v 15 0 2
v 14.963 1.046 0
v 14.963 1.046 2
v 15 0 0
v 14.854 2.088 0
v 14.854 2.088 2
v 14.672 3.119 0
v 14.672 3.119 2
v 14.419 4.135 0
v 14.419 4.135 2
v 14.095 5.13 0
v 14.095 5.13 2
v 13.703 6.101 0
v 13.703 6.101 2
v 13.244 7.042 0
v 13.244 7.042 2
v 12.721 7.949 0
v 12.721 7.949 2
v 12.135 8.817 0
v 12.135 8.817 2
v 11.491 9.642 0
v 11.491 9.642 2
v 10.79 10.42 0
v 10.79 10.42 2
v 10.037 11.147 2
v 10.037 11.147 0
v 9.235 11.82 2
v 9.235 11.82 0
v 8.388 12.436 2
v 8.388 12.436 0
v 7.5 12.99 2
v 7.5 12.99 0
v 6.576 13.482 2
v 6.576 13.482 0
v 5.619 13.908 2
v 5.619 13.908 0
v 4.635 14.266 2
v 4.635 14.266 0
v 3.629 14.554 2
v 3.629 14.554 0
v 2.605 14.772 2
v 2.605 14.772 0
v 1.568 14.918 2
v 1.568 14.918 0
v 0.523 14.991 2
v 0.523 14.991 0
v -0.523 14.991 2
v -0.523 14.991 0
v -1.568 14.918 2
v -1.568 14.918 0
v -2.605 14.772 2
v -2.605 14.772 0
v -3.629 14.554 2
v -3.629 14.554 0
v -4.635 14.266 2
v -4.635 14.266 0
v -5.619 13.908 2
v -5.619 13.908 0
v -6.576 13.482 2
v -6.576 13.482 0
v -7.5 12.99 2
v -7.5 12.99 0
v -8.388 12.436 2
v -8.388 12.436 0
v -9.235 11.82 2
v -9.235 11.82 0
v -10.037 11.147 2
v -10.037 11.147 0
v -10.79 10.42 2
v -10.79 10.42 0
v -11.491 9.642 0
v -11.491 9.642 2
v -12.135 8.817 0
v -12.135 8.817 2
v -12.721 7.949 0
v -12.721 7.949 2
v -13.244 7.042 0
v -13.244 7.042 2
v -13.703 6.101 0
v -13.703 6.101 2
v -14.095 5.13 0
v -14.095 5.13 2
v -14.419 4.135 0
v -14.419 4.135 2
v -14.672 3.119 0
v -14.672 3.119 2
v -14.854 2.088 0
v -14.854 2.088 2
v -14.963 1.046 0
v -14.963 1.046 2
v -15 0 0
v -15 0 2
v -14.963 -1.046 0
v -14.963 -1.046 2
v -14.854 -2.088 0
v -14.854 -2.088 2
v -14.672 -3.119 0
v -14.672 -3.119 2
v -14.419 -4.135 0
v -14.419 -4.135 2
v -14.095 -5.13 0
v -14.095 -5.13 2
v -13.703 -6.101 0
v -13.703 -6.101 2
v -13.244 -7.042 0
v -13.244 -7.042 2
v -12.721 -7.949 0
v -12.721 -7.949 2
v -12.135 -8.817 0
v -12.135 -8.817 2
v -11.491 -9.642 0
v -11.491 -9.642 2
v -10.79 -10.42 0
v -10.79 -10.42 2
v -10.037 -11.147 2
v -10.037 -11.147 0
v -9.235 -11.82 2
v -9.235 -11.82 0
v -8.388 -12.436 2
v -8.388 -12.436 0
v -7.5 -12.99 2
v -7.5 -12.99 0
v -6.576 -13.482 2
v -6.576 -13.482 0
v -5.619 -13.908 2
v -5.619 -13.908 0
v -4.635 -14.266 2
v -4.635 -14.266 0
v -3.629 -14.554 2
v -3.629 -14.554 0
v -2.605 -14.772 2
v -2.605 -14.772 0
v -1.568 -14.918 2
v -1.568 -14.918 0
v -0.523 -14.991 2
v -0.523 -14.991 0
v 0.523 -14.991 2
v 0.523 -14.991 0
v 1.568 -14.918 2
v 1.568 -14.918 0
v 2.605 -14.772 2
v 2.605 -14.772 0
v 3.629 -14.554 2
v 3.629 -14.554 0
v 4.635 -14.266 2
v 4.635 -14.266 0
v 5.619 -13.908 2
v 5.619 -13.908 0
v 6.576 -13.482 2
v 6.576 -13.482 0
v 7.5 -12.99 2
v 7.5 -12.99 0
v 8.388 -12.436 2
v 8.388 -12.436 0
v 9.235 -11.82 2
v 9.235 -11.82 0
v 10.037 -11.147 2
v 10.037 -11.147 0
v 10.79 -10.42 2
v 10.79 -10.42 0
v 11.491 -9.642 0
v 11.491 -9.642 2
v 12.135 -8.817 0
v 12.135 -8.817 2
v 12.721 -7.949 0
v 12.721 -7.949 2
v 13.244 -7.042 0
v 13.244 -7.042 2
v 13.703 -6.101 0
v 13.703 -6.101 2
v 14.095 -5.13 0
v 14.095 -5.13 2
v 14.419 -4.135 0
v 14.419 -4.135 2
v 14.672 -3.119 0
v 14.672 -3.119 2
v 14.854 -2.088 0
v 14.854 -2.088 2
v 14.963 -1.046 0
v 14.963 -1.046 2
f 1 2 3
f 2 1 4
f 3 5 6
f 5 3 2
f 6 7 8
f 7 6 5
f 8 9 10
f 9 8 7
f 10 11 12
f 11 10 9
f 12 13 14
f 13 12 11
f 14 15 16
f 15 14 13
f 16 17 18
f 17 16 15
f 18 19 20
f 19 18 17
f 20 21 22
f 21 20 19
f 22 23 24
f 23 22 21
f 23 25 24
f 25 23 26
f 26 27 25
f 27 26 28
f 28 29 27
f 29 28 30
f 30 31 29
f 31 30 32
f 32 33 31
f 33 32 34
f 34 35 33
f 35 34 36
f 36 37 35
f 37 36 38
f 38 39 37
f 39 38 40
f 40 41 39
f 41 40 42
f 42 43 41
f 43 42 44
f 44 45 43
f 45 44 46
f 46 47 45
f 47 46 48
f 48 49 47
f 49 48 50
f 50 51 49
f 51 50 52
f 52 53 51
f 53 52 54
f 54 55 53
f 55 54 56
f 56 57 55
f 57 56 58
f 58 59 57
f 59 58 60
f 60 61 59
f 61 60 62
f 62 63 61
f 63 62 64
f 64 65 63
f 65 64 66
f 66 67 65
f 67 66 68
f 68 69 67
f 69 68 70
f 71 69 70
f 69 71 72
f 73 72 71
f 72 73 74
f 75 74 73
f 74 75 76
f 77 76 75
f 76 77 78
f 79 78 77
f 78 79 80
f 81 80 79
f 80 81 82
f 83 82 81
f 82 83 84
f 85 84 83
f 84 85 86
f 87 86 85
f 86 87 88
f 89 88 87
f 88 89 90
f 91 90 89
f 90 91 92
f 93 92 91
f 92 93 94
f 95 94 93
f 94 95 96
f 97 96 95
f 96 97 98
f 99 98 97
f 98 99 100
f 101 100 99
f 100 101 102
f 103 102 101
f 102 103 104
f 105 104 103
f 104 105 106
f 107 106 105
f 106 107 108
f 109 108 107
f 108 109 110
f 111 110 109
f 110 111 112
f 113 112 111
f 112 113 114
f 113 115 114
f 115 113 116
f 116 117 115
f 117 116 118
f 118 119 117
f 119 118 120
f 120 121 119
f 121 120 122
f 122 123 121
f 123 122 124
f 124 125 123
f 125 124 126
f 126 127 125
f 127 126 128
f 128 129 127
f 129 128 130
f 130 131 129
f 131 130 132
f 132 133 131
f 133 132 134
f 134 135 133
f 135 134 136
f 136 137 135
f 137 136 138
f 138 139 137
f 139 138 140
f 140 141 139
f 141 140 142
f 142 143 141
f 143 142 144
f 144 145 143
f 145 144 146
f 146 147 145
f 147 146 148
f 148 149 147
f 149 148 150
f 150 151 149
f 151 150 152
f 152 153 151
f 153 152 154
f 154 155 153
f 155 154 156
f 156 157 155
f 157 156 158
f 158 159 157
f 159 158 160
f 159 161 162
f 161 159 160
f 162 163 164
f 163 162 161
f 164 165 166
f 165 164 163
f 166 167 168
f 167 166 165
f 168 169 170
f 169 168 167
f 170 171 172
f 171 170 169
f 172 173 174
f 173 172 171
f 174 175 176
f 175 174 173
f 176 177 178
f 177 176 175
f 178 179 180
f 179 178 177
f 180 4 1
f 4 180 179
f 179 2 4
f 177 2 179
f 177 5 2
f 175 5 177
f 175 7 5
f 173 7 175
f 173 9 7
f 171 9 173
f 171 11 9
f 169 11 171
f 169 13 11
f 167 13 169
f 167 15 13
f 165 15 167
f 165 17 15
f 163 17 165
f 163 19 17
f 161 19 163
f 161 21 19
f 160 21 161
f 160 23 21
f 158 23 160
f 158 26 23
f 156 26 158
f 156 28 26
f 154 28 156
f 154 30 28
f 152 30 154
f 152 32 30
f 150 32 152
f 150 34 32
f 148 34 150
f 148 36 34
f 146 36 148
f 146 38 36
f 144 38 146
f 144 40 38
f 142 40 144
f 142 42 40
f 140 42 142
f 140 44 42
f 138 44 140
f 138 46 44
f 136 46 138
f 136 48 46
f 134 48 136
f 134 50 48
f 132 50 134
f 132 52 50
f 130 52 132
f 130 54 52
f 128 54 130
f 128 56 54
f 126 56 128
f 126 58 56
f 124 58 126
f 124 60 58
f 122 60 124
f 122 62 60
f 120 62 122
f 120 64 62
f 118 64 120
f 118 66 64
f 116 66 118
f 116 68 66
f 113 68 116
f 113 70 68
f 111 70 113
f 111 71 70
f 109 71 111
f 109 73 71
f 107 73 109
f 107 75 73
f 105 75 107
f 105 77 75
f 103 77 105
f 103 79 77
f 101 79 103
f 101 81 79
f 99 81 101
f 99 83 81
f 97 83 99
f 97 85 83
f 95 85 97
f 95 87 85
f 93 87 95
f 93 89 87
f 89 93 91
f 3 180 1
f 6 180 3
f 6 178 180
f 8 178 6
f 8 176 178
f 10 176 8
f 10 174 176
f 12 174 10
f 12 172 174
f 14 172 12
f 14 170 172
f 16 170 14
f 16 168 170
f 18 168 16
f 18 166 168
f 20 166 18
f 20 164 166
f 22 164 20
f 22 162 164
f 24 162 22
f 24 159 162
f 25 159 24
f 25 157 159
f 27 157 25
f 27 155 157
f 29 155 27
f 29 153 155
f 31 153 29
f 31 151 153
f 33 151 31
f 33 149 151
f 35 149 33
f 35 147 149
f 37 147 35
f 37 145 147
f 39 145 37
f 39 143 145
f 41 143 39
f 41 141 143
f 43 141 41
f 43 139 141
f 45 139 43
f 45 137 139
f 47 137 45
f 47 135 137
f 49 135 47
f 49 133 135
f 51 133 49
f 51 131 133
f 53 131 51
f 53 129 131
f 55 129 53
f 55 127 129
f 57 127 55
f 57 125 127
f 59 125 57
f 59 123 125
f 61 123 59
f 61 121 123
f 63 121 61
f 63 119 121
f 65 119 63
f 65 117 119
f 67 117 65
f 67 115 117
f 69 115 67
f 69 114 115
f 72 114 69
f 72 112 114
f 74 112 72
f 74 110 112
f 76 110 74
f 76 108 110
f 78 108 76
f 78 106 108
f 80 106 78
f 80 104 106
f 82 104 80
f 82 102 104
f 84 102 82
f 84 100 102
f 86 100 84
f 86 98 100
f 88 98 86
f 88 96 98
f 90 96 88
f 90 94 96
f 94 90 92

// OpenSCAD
//------------parameters---------------------------
// diameter of circle
diameter=30;  
// Thickness 
thickness=2;  
// resolution
$fn=90;

//-------------------------------------------------
cylinder (r=diameter/2,h=thickness);
